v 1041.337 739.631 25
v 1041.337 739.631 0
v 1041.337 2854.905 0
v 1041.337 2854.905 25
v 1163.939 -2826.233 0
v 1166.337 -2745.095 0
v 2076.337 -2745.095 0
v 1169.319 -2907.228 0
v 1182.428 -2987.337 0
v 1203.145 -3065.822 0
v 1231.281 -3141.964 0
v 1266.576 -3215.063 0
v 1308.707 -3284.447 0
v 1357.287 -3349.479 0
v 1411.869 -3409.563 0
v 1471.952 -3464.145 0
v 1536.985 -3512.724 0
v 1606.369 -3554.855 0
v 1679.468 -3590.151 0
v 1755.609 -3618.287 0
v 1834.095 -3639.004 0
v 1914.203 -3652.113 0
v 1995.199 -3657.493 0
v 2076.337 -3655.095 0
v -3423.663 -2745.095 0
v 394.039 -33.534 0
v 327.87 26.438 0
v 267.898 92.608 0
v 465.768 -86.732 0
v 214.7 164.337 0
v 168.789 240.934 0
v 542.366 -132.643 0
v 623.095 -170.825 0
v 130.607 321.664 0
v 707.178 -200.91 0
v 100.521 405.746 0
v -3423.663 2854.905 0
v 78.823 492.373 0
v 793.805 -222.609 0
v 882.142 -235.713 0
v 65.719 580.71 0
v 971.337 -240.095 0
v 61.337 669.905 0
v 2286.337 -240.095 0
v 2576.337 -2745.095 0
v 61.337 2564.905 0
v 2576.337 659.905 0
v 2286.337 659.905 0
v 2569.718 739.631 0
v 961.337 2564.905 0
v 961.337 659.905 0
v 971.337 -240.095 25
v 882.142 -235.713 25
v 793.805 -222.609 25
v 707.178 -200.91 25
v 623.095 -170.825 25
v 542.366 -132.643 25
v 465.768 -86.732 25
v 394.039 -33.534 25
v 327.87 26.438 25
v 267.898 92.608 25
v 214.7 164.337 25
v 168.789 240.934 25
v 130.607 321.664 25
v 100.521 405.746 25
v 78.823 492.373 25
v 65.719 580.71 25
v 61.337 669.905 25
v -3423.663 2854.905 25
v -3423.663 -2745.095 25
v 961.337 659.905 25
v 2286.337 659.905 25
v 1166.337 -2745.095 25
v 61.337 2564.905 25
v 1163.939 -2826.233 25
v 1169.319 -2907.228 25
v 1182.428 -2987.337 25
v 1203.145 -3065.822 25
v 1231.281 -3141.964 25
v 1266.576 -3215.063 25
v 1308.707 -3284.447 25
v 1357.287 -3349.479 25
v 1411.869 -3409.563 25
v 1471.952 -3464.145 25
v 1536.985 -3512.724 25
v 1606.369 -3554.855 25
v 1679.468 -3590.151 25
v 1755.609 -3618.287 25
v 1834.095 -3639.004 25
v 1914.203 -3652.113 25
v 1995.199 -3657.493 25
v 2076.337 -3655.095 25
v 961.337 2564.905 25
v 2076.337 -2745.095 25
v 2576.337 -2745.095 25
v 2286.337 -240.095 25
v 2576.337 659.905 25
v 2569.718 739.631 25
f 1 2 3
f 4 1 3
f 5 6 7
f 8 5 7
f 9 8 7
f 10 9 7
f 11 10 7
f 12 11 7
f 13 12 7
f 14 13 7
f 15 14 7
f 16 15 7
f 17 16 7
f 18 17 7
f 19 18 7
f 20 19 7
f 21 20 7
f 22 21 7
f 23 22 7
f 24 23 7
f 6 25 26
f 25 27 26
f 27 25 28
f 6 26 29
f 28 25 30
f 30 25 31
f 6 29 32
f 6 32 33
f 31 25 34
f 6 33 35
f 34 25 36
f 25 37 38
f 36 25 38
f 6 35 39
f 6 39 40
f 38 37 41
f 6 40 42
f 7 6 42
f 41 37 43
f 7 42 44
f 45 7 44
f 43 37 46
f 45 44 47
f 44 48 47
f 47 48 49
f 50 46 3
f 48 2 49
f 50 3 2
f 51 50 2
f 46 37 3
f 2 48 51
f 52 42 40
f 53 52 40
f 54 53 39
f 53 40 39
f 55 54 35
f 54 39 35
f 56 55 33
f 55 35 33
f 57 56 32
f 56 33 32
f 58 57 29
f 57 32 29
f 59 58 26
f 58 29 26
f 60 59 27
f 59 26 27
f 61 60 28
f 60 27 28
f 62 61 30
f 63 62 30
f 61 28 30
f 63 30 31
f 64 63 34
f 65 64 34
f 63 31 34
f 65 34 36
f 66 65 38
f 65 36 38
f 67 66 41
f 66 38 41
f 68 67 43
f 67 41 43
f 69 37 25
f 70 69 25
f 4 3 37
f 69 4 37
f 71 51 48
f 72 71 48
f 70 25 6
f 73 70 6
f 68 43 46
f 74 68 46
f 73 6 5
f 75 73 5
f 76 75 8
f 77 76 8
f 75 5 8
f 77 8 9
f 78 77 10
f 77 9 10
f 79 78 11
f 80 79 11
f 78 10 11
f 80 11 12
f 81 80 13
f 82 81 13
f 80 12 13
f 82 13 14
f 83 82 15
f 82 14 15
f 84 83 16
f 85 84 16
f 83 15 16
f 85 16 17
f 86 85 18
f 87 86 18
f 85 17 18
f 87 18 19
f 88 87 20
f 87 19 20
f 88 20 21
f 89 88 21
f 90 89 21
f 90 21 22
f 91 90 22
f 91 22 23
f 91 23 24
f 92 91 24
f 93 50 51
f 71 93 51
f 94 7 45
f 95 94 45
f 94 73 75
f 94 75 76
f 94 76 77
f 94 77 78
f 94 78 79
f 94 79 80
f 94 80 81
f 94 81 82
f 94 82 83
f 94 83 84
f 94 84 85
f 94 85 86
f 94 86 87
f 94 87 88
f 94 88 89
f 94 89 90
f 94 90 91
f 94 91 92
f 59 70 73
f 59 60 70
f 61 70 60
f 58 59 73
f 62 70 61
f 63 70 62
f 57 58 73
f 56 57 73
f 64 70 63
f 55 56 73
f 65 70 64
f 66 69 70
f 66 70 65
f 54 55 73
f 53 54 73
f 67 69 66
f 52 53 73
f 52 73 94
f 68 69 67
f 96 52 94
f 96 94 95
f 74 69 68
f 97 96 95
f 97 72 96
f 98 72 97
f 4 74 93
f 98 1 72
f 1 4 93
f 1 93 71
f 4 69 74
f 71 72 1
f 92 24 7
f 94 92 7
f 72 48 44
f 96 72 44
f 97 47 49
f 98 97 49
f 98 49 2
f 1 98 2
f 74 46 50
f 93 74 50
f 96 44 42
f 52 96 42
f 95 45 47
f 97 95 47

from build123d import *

# Parameters (mm, degrees)
F0_W     = 450
F0_H     = 290
F0_W_2   = 290
F0_H_2   = 450
F1_DEPTH = 25


with BuildPart() as f1:
    # F0 (on Top) → F1 (new body)
    with BuildSketch(Plane.XY):
        with BuildLine():
            Line((61.33711, 2854.905434), (-3423.66289, 2854.905434))
            Line((-3423.66289, 2854.905434), (-3423.66289, -2745.094566))
            Line((-3423.66289, -2745.094566), (1166.33711, -2745.094566))
            ThreePointArc((1166.33711, -2745.094566), (1411.869148, -3409.562528), (2076.33711, -3655.094566))
            Line((2076.33711, -3655.094566), (2076.33711, -2827.612638))
            Line((2076.33711, -2827.612638), (2076.33711, -2745.094566))
            Line((2076.33711, -2745.094566), (2576.33711, -2745.094566))
            Line((2576.33711, -2745.094566), (2576.33711, -240.094566))
            Line((2576.33711, -240.094566), (2286.33711, -240.094566))
            Line((2286.33711, -240.094566), (1996.33711, -240.094566))
            Line((1996.33711, -240.094566), (1706.33711, -240.094566))
            Line((1706.33711, -240.094566), (1416.33711, -240.094566))
            Line((1416.33711, -240.094566), (971.33711, -240.094566))
            ThreePointArc((971.33711, -240.094566), (327.86994, 26.438263), (61.33711, 669.905434))
            Line((61.33711, 669.905434), (61.33711, 1114.905434))
            Line((61.33711, 1114.905434), (61.33711, 1404.905434))
            Line((61.33711, 1404.905434), (61.33711, 1694.905434))
            Line((61.33711, 1694.905434), (61.33711, 1984.905434))
            Line((61.33711, 1984.905434), (61.33711, 2274.905434))
            Line((61.33711, 2274.905434), (61.33711, 2564.905434))
            Line((61.33711, 2564.905434), (61.33711, 2854.905434))
        make_face()
        with Locations((286.33711, 2709.905434)):
            Rectangle(F0_W, F0_H)
        with Locations((736.33711, 2709.905434)):
            Rectangle(F0_W, F0_H)
        Polygon((1041.33711, 2854.905434), (961.33711, 2854.905434), (961.33711, 2564.905434), (961.33711, 2274.905434), (961.33711, 1984.905434), (961.33711, 1694.905434), (961.33711, 1404.905434), (961.33711, 1114.905434), (961.33711, 659.905434), (1416.33711, 659.905434), (1706.33711, 659.905434), (1996.33711, 659.905434), (2286.33711, 659.905434), (2576.33711, 659.905434), (2569.717802, 739.631118), (1041.33711, 739.631118), align=None)
        with Locations((2431.33711, -15.094566)):
            Rectangle(F0_W_2, F0_H_2)
        with Locations((2431.33711, 434.905434)):
            Rectangle(F0_W_2, F0_H_2)
    extrude(amount=F1_DEPTH)


solid = f1.part
